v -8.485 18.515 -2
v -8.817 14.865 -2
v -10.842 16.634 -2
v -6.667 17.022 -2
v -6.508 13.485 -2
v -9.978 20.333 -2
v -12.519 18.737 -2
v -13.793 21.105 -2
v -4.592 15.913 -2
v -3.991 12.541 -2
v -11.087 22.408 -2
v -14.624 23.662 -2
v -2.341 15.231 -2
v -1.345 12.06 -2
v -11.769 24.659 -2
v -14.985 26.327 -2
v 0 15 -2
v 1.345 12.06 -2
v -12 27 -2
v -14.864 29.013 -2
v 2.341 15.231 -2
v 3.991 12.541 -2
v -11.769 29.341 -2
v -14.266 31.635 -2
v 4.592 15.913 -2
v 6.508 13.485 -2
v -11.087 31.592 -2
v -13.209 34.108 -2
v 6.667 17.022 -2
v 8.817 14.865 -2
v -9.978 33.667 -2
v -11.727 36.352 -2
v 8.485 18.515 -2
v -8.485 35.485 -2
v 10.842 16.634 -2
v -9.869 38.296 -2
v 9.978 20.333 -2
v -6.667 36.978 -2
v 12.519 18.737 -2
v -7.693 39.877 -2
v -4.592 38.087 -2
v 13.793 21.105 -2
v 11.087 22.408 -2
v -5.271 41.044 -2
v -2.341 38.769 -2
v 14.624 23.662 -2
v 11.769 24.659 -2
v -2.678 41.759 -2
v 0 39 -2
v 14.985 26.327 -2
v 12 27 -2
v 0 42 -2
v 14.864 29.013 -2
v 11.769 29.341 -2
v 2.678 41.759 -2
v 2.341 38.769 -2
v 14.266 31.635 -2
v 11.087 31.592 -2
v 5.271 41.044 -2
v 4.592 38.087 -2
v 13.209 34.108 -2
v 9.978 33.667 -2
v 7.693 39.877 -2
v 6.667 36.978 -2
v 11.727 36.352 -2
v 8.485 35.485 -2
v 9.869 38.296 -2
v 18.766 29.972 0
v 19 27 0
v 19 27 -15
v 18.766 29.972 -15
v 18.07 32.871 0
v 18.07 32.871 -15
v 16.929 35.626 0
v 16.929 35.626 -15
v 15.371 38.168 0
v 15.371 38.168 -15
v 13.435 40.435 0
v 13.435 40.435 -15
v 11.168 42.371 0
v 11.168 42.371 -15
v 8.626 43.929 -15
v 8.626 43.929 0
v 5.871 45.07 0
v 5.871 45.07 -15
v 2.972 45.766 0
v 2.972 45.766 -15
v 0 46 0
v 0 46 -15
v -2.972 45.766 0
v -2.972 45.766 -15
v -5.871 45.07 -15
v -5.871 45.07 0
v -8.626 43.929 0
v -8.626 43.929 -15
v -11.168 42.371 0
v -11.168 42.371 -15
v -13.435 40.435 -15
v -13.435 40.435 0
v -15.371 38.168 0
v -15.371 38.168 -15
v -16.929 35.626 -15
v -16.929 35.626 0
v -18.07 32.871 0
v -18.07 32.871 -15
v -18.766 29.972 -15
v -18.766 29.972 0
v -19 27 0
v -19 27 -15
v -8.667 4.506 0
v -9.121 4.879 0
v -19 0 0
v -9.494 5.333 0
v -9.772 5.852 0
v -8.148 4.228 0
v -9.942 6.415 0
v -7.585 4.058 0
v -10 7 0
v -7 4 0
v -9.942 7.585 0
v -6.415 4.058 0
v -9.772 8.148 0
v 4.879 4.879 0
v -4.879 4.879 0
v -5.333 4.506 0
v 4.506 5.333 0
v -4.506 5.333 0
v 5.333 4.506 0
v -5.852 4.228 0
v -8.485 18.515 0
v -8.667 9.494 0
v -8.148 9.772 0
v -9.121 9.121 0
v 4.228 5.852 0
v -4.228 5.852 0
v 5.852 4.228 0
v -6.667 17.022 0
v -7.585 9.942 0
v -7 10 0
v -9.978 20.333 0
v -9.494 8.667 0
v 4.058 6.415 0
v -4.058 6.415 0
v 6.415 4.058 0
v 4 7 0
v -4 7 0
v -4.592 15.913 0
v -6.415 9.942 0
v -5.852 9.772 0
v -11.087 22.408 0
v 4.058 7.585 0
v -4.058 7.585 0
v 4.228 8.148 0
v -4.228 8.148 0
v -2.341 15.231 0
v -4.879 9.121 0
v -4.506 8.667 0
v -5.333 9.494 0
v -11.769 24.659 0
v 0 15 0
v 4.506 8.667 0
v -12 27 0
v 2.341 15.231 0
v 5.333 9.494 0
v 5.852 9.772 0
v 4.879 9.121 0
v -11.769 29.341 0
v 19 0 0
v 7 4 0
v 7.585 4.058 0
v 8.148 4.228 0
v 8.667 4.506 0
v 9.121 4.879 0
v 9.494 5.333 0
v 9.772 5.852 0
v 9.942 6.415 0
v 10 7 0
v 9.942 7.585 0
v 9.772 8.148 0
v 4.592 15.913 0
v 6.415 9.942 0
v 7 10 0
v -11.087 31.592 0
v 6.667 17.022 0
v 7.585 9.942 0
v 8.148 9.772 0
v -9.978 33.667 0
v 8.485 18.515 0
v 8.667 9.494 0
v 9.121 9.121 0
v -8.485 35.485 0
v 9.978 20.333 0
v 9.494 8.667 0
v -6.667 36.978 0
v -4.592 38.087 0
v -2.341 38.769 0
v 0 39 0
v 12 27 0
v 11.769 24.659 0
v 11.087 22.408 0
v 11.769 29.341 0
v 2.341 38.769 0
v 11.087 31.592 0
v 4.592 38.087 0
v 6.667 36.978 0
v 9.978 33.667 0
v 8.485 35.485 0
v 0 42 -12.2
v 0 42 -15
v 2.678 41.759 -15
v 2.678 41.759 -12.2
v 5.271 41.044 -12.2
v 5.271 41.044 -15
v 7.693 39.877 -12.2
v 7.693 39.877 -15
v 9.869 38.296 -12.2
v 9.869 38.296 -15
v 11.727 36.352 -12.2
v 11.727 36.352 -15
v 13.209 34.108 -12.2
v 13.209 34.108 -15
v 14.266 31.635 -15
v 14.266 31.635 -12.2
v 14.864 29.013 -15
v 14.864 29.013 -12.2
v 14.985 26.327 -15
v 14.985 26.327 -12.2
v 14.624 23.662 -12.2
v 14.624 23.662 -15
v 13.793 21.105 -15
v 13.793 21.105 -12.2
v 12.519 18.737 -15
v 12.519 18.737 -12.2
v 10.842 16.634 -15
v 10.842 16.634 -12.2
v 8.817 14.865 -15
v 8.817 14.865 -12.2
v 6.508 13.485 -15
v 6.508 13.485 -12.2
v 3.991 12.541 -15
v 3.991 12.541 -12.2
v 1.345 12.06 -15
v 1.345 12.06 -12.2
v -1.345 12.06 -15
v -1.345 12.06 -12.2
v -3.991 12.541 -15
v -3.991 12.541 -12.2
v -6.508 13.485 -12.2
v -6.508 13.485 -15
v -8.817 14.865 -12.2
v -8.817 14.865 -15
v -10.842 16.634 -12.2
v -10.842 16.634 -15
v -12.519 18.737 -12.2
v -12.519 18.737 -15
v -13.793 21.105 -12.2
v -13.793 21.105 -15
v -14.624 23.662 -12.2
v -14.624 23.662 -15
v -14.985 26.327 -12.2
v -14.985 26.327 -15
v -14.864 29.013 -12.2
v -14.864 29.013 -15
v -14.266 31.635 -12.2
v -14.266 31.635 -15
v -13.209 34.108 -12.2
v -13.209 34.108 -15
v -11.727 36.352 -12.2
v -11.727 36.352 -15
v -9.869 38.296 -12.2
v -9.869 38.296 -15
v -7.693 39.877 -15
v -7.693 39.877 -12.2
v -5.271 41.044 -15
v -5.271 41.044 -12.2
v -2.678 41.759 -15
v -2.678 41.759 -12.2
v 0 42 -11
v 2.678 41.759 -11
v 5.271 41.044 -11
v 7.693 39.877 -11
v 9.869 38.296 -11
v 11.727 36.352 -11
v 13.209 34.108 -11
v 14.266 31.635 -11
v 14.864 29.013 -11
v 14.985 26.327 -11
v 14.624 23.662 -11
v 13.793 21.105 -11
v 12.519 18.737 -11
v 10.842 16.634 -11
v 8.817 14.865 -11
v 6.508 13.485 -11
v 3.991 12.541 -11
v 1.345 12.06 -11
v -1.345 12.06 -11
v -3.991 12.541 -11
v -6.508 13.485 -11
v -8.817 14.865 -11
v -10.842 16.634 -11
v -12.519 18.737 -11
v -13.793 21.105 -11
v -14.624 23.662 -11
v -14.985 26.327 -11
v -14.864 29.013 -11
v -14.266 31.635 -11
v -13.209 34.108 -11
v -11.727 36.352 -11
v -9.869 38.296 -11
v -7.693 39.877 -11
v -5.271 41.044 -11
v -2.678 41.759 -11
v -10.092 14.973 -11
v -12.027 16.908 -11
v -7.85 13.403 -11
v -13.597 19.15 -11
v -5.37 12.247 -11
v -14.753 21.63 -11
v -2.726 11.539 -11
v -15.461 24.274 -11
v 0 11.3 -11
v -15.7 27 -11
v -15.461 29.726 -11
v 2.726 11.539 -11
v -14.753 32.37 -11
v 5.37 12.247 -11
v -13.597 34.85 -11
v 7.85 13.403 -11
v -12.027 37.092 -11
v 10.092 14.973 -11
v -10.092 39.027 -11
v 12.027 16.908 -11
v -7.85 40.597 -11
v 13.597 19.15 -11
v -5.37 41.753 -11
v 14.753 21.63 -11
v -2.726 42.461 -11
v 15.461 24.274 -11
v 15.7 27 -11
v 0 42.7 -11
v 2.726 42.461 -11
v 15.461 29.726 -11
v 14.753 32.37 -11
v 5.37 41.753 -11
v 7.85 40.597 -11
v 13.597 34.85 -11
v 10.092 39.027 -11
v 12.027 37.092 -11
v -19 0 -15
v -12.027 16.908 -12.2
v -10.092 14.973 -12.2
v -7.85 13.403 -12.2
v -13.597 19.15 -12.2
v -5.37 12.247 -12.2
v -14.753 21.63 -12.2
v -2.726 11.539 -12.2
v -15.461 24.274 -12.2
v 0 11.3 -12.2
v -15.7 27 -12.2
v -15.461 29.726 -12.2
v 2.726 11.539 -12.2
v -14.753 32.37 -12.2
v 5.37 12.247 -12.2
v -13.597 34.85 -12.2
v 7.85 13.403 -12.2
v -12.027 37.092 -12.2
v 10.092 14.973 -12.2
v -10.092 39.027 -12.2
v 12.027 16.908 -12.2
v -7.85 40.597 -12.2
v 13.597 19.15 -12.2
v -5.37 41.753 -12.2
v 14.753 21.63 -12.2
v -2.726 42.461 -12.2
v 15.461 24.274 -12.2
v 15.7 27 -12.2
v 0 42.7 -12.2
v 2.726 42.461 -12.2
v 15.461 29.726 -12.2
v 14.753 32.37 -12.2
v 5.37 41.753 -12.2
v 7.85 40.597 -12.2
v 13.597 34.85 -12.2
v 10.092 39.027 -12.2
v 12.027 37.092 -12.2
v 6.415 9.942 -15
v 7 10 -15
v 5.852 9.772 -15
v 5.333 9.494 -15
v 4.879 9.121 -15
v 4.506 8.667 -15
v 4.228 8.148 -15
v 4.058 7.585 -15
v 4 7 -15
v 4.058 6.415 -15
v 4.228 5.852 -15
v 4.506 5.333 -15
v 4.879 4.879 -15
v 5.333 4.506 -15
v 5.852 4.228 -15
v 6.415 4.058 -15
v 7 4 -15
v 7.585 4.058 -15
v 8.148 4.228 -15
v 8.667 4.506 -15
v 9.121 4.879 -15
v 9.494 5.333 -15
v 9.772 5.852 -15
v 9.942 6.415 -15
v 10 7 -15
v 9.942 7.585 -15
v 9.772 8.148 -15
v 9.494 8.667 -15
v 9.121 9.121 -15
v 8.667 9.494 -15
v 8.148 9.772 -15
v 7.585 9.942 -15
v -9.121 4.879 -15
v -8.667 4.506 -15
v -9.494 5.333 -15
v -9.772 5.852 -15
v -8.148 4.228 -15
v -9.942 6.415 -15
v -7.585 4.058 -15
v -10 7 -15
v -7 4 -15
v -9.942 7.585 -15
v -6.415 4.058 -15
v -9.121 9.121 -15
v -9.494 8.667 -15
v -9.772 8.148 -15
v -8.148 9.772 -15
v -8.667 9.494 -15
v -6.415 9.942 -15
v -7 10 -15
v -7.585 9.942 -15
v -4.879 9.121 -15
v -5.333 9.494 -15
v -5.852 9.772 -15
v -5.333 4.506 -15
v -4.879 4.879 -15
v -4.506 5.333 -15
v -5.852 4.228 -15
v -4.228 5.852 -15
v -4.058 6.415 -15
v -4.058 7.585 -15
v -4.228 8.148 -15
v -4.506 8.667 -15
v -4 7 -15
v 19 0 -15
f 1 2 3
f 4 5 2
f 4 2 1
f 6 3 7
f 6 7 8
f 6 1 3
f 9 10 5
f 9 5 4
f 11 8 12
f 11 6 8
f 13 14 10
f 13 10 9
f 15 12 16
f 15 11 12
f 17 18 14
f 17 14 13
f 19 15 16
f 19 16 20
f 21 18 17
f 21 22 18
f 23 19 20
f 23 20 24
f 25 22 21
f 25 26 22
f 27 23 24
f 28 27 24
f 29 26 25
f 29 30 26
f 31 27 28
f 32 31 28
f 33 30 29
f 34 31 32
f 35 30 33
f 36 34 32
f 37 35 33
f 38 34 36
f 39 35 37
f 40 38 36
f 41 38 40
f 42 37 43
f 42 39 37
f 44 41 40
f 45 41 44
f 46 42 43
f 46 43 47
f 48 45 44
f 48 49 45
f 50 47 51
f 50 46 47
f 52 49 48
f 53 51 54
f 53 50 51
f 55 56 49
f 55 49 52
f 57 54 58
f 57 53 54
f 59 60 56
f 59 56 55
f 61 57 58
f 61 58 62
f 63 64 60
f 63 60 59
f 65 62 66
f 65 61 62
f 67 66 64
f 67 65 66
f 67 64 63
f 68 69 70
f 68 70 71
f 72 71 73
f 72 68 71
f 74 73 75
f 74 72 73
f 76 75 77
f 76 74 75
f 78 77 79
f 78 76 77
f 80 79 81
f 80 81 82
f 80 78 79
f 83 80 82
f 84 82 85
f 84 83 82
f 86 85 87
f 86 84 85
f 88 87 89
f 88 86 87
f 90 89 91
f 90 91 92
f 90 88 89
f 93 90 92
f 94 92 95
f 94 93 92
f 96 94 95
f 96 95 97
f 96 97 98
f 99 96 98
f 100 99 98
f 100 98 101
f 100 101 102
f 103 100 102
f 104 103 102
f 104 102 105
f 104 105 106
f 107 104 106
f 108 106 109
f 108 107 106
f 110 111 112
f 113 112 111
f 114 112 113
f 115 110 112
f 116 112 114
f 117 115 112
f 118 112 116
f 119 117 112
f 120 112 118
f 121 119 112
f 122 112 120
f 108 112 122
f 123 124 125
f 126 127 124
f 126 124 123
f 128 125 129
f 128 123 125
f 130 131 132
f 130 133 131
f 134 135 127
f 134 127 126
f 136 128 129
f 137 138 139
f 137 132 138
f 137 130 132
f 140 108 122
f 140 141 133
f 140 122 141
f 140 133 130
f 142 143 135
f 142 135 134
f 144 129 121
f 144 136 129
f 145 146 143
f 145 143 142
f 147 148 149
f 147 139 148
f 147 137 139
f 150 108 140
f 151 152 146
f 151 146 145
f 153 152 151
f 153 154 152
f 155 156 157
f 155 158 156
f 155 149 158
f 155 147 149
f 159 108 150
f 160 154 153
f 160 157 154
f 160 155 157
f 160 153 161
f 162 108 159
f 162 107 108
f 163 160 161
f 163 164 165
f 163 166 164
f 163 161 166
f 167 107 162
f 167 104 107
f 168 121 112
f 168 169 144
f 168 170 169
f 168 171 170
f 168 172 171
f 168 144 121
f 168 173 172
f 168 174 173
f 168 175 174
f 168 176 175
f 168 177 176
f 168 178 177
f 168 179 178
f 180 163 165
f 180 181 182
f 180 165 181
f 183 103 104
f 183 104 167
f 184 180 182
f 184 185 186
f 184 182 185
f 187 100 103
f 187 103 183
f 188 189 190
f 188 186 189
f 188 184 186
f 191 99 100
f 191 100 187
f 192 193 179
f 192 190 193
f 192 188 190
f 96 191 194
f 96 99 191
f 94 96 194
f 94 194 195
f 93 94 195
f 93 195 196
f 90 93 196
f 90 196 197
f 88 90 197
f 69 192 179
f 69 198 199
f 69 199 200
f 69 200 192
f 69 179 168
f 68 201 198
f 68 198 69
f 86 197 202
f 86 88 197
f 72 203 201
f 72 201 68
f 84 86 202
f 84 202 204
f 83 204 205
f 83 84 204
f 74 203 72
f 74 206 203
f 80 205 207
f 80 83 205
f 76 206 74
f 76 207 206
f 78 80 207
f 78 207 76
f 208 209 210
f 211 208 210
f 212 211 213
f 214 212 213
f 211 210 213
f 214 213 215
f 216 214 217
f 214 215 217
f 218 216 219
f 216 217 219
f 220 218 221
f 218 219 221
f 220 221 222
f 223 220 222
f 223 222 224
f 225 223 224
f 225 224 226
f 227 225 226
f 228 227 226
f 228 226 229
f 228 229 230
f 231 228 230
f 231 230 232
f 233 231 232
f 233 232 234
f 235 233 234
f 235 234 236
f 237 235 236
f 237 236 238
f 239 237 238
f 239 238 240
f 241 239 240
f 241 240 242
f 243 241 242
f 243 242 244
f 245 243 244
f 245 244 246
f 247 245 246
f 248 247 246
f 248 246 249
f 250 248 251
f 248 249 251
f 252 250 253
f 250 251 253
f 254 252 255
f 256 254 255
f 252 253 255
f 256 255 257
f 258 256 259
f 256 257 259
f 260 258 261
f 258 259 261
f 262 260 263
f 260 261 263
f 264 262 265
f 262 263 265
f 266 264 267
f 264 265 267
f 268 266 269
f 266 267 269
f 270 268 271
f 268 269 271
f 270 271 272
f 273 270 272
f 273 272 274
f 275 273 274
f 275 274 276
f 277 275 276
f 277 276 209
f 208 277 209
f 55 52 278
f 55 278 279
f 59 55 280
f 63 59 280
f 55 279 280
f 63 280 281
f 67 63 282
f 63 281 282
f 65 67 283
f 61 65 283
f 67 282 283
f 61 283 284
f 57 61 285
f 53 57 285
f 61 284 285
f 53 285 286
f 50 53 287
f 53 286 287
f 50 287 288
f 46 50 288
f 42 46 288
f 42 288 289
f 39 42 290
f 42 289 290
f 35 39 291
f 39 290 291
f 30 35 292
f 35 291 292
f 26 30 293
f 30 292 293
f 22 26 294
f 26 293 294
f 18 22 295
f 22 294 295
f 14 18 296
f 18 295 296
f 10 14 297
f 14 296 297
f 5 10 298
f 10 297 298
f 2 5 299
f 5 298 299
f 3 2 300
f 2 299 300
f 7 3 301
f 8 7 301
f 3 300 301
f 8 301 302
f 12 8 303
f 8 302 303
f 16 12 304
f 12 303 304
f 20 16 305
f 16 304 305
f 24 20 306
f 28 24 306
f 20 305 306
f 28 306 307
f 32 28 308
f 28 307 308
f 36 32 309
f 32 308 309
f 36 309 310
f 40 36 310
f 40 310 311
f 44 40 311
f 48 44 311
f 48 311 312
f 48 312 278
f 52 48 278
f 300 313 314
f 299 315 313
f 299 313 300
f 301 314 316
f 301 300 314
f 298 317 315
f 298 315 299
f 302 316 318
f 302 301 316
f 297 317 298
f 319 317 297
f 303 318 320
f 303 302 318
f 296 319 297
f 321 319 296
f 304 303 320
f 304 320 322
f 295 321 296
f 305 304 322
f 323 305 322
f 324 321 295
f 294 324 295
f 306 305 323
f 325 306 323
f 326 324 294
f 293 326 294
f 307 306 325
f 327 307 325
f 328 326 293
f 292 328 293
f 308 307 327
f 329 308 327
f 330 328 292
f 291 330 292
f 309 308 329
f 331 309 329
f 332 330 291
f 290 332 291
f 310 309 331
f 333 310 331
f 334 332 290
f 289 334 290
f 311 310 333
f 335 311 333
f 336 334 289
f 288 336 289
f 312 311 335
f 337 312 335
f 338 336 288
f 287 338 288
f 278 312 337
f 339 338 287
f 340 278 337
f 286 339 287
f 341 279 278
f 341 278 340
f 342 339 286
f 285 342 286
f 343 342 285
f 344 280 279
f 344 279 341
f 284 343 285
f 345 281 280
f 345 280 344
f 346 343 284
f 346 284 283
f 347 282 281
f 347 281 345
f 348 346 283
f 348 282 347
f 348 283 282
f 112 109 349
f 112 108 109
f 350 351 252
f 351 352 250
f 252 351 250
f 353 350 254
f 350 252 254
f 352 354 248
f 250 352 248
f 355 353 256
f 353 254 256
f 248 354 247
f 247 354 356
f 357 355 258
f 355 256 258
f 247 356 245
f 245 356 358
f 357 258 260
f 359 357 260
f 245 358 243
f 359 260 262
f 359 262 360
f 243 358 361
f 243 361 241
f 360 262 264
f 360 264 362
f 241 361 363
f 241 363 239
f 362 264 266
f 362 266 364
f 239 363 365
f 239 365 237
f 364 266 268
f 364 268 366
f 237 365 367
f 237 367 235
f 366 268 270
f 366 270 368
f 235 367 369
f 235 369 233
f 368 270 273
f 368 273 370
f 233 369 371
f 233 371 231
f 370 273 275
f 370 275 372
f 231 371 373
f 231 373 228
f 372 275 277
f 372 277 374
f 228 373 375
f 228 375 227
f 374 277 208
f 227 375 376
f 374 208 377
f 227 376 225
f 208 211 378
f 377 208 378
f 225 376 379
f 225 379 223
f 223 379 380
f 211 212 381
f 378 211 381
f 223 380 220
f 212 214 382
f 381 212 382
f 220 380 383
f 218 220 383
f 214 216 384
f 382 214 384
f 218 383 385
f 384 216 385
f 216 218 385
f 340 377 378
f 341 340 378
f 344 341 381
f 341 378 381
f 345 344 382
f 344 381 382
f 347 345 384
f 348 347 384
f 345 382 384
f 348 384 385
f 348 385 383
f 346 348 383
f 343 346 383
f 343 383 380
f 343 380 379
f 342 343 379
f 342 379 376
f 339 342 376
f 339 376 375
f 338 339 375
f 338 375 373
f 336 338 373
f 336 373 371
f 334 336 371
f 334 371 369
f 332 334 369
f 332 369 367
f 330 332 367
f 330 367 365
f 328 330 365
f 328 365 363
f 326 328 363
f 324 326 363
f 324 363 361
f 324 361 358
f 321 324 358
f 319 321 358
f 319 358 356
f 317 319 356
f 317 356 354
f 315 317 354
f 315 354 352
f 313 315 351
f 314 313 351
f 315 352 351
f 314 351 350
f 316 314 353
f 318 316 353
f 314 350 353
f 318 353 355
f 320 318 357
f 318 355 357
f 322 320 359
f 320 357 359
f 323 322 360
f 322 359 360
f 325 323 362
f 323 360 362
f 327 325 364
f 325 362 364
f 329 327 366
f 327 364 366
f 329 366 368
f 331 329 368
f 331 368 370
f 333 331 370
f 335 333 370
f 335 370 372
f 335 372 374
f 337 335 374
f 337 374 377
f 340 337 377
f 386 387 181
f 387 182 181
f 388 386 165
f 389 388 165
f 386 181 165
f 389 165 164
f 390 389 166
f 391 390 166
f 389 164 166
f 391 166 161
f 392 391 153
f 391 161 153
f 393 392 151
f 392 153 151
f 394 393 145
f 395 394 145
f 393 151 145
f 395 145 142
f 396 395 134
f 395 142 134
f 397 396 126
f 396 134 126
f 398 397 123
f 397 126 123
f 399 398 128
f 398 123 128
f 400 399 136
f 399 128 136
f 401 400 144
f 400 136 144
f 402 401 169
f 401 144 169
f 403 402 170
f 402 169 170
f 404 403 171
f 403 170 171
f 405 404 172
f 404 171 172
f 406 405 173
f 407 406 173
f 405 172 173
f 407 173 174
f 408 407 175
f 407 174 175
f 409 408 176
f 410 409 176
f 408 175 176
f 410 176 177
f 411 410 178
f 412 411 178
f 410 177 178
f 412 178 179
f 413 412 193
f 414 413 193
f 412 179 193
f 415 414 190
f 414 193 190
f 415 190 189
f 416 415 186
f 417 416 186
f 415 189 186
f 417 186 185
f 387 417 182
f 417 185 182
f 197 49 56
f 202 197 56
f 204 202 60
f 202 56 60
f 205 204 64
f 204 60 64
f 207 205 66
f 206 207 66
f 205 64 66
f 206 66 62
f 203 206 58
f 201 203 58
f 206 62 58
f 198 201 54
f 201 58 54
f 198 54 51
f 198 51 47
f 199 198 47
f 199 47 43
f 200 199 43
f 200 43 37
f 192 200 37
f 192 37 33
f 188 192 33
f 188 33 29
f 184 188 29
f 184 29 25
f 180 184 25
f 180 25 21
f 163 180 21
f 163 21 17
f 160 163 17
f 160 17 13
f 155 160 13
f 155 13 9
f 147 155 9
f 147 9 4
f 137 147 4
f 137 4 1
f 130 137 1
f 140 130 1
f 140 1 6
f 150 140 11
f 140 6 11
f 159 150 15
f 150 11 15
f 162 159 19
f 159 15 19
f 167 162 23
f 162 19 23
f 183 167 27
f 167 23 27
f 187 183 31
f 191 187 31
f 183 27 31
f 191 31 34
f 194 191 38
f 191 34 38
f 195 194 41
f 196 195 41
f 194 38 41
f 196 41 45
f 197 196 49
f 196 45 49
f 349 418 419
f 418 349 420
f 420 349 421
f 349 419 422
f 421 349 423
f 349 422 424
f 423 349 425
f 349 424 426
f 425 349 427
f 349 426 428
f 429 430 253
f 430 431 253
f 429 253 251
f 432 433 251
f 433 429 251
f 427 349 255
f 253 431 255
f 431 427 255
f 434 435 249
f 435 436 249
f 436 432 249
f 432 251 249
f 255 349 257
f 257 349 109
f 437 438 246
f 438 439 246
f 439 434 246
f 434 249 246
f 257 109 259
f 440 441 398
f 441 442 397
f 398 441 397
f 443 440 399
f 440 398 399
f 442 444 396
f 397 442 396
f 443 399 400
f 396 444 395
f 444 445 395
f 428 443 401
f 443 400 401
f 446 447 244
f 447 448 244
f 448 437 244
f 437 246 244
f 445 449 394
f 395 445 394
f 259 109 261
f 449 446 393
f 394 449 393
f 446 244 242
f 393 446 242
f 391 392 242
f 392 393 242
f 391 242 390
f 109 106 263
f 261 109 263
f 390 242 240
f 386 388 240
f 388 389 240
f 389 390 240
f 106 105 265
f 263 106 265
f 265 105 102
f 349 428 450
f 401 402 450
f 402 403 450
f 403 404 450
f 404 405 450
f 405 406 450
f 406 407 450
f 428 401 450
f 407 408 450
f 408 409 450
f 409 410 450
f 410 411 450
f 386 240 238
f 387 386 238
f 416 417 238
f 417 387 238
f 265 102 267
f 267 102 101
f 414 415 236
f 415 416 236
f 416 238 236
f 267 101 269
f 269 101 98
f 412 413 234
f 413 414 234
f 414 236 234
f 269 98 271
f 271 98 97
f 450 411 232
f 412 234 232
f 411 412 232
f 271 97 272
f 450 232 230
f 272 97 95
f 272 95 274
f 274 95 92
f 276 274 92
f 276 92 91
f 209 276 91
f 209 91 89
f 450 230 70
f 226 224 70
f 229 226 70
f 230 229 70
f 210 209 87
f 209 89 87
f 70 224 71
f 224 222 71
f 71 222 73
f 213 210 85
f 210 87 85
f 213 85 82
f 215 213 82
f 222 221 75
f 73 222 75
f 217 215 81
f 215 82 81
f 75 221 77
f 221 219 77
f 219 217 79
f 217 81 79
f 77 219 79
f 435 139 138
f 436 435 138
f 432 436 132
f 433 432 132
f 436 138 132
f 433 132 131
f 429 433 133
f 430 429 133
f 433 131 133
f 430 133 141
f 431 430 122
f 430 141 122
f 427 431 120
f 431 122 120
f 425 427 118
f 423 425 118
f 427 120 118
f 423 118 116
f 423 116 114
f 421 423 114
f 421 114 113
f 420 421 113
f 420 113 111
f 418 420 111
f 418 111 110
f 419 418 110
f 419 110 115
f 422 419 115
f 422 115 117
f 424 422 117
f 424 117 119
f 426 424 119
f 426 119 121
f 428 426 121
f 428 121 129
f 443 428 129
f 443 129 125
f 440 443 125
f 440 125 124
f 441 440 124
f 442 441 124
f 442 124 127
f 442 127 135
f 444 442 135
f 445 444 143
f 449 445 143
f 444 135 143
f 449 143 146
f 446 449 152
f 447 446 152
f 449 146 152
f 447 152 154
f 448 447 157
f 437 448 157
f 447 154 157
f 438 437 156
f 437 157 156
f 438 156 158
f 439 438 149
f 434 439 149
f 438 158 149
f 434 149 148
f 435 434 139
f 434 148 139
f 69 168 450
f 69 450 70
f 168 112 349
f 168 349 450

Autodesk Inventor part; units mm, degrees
sketch "Sketch_7" plane through (0, 0, 0) normal (0, 0, 1) x (1, 0, 0)
  line L0 (-19, 27) -> (-19, 0)
  line L1 (-19, 0) -> (19, 0)
  line L2 (19, 0) -> (19, 27)
  arc A0 (19, 27) -> (-19, 27) centre (0, 27) ccw
extrude "Extrusion1" add sketch "Sketch_7" against normal blind 15
sketch "Sketch_8" plane through (0, 0, 0) normal (1, 0, 0) x (0, 0, -1)
  line L0 (15, 27) -> (2, 27)
  line L1 (2, 27) -> (2, 42)
  line L2 (2, 42) -> (11, 42)
  line L3 (11, 42) -> (11, 42.7)
  line L4 (11, 42.7) -> (12.2, 42.7)
  line L5 (12.2, 42.7) -> (12.2, 42)
  line L6 (12.2, 42) -> (15, 42)
  line L7 (15, 42) -> (15, 27)
  line L8 (15, 27) -> (2, 27)
revolve "Revolution1" cut sketch "Sketch_8" angle 360 about axis through (0, 27, -15) along (0, 0, -1)
sketch "Sketch_1" plane through (0, 0, 0) normal (1, 0, 0) x (0, 0, -1)
  line L0 (15, 27) -> (0, 27)
  line L1 (0, 27) -> (0, 39)
  line L2 (0, 39) -> (15, 39)
  line L3 (15, 39) -> (15, 27)
  line L4 (15, 27) -> (0, 27)
revolve "Revolution2" cut sketch "Sketch_1" angle 360 about axis through (0, 27, -15) along (0, 0, -1)
sketch "Sketch4" plane through (0, 0, -15) normal (0, 0, -1) x (-1, 0, 0)
  point P0 (7, 7)
hole "Hole1" at (-7, 7, -15) direction (0, 0, 1) diameter 6 depth 15
pattern_linear "Rectangular Pattern1" count 2 spacing 14 along (1, 0, 0) of "Hole1"
ref_plane "to_bearing_XY" through (0, 27, -6.5) normal (0, 0, 1) x (1, 0, 0)
ref_plane "to_bearing_YZ" through (0, 27, -6.5) normal (1, 0, 0) x (0, 1, 0)
ref_plane "to_bearing_ZX" through (0, 27, -6.5) normal (0, 1, 0) x (0, 0, 1)
ref_plane "to_retaining_ring_XY" through (0, 27, -12.2) normal (0, 0, -1) x (1, 0, 0)
ref_plane "to_retaining_ring_YZ" through (0, 27, -12.2) normal (1, 0, 0) x (0, -1, 0)
ref_plane "to_retaining_ring_ZX" through (0, 27, -12.2) normal (0, -1, 0) x (0, 0, -1)
properties part number "SBGSMA6200ZZ-20_h"
